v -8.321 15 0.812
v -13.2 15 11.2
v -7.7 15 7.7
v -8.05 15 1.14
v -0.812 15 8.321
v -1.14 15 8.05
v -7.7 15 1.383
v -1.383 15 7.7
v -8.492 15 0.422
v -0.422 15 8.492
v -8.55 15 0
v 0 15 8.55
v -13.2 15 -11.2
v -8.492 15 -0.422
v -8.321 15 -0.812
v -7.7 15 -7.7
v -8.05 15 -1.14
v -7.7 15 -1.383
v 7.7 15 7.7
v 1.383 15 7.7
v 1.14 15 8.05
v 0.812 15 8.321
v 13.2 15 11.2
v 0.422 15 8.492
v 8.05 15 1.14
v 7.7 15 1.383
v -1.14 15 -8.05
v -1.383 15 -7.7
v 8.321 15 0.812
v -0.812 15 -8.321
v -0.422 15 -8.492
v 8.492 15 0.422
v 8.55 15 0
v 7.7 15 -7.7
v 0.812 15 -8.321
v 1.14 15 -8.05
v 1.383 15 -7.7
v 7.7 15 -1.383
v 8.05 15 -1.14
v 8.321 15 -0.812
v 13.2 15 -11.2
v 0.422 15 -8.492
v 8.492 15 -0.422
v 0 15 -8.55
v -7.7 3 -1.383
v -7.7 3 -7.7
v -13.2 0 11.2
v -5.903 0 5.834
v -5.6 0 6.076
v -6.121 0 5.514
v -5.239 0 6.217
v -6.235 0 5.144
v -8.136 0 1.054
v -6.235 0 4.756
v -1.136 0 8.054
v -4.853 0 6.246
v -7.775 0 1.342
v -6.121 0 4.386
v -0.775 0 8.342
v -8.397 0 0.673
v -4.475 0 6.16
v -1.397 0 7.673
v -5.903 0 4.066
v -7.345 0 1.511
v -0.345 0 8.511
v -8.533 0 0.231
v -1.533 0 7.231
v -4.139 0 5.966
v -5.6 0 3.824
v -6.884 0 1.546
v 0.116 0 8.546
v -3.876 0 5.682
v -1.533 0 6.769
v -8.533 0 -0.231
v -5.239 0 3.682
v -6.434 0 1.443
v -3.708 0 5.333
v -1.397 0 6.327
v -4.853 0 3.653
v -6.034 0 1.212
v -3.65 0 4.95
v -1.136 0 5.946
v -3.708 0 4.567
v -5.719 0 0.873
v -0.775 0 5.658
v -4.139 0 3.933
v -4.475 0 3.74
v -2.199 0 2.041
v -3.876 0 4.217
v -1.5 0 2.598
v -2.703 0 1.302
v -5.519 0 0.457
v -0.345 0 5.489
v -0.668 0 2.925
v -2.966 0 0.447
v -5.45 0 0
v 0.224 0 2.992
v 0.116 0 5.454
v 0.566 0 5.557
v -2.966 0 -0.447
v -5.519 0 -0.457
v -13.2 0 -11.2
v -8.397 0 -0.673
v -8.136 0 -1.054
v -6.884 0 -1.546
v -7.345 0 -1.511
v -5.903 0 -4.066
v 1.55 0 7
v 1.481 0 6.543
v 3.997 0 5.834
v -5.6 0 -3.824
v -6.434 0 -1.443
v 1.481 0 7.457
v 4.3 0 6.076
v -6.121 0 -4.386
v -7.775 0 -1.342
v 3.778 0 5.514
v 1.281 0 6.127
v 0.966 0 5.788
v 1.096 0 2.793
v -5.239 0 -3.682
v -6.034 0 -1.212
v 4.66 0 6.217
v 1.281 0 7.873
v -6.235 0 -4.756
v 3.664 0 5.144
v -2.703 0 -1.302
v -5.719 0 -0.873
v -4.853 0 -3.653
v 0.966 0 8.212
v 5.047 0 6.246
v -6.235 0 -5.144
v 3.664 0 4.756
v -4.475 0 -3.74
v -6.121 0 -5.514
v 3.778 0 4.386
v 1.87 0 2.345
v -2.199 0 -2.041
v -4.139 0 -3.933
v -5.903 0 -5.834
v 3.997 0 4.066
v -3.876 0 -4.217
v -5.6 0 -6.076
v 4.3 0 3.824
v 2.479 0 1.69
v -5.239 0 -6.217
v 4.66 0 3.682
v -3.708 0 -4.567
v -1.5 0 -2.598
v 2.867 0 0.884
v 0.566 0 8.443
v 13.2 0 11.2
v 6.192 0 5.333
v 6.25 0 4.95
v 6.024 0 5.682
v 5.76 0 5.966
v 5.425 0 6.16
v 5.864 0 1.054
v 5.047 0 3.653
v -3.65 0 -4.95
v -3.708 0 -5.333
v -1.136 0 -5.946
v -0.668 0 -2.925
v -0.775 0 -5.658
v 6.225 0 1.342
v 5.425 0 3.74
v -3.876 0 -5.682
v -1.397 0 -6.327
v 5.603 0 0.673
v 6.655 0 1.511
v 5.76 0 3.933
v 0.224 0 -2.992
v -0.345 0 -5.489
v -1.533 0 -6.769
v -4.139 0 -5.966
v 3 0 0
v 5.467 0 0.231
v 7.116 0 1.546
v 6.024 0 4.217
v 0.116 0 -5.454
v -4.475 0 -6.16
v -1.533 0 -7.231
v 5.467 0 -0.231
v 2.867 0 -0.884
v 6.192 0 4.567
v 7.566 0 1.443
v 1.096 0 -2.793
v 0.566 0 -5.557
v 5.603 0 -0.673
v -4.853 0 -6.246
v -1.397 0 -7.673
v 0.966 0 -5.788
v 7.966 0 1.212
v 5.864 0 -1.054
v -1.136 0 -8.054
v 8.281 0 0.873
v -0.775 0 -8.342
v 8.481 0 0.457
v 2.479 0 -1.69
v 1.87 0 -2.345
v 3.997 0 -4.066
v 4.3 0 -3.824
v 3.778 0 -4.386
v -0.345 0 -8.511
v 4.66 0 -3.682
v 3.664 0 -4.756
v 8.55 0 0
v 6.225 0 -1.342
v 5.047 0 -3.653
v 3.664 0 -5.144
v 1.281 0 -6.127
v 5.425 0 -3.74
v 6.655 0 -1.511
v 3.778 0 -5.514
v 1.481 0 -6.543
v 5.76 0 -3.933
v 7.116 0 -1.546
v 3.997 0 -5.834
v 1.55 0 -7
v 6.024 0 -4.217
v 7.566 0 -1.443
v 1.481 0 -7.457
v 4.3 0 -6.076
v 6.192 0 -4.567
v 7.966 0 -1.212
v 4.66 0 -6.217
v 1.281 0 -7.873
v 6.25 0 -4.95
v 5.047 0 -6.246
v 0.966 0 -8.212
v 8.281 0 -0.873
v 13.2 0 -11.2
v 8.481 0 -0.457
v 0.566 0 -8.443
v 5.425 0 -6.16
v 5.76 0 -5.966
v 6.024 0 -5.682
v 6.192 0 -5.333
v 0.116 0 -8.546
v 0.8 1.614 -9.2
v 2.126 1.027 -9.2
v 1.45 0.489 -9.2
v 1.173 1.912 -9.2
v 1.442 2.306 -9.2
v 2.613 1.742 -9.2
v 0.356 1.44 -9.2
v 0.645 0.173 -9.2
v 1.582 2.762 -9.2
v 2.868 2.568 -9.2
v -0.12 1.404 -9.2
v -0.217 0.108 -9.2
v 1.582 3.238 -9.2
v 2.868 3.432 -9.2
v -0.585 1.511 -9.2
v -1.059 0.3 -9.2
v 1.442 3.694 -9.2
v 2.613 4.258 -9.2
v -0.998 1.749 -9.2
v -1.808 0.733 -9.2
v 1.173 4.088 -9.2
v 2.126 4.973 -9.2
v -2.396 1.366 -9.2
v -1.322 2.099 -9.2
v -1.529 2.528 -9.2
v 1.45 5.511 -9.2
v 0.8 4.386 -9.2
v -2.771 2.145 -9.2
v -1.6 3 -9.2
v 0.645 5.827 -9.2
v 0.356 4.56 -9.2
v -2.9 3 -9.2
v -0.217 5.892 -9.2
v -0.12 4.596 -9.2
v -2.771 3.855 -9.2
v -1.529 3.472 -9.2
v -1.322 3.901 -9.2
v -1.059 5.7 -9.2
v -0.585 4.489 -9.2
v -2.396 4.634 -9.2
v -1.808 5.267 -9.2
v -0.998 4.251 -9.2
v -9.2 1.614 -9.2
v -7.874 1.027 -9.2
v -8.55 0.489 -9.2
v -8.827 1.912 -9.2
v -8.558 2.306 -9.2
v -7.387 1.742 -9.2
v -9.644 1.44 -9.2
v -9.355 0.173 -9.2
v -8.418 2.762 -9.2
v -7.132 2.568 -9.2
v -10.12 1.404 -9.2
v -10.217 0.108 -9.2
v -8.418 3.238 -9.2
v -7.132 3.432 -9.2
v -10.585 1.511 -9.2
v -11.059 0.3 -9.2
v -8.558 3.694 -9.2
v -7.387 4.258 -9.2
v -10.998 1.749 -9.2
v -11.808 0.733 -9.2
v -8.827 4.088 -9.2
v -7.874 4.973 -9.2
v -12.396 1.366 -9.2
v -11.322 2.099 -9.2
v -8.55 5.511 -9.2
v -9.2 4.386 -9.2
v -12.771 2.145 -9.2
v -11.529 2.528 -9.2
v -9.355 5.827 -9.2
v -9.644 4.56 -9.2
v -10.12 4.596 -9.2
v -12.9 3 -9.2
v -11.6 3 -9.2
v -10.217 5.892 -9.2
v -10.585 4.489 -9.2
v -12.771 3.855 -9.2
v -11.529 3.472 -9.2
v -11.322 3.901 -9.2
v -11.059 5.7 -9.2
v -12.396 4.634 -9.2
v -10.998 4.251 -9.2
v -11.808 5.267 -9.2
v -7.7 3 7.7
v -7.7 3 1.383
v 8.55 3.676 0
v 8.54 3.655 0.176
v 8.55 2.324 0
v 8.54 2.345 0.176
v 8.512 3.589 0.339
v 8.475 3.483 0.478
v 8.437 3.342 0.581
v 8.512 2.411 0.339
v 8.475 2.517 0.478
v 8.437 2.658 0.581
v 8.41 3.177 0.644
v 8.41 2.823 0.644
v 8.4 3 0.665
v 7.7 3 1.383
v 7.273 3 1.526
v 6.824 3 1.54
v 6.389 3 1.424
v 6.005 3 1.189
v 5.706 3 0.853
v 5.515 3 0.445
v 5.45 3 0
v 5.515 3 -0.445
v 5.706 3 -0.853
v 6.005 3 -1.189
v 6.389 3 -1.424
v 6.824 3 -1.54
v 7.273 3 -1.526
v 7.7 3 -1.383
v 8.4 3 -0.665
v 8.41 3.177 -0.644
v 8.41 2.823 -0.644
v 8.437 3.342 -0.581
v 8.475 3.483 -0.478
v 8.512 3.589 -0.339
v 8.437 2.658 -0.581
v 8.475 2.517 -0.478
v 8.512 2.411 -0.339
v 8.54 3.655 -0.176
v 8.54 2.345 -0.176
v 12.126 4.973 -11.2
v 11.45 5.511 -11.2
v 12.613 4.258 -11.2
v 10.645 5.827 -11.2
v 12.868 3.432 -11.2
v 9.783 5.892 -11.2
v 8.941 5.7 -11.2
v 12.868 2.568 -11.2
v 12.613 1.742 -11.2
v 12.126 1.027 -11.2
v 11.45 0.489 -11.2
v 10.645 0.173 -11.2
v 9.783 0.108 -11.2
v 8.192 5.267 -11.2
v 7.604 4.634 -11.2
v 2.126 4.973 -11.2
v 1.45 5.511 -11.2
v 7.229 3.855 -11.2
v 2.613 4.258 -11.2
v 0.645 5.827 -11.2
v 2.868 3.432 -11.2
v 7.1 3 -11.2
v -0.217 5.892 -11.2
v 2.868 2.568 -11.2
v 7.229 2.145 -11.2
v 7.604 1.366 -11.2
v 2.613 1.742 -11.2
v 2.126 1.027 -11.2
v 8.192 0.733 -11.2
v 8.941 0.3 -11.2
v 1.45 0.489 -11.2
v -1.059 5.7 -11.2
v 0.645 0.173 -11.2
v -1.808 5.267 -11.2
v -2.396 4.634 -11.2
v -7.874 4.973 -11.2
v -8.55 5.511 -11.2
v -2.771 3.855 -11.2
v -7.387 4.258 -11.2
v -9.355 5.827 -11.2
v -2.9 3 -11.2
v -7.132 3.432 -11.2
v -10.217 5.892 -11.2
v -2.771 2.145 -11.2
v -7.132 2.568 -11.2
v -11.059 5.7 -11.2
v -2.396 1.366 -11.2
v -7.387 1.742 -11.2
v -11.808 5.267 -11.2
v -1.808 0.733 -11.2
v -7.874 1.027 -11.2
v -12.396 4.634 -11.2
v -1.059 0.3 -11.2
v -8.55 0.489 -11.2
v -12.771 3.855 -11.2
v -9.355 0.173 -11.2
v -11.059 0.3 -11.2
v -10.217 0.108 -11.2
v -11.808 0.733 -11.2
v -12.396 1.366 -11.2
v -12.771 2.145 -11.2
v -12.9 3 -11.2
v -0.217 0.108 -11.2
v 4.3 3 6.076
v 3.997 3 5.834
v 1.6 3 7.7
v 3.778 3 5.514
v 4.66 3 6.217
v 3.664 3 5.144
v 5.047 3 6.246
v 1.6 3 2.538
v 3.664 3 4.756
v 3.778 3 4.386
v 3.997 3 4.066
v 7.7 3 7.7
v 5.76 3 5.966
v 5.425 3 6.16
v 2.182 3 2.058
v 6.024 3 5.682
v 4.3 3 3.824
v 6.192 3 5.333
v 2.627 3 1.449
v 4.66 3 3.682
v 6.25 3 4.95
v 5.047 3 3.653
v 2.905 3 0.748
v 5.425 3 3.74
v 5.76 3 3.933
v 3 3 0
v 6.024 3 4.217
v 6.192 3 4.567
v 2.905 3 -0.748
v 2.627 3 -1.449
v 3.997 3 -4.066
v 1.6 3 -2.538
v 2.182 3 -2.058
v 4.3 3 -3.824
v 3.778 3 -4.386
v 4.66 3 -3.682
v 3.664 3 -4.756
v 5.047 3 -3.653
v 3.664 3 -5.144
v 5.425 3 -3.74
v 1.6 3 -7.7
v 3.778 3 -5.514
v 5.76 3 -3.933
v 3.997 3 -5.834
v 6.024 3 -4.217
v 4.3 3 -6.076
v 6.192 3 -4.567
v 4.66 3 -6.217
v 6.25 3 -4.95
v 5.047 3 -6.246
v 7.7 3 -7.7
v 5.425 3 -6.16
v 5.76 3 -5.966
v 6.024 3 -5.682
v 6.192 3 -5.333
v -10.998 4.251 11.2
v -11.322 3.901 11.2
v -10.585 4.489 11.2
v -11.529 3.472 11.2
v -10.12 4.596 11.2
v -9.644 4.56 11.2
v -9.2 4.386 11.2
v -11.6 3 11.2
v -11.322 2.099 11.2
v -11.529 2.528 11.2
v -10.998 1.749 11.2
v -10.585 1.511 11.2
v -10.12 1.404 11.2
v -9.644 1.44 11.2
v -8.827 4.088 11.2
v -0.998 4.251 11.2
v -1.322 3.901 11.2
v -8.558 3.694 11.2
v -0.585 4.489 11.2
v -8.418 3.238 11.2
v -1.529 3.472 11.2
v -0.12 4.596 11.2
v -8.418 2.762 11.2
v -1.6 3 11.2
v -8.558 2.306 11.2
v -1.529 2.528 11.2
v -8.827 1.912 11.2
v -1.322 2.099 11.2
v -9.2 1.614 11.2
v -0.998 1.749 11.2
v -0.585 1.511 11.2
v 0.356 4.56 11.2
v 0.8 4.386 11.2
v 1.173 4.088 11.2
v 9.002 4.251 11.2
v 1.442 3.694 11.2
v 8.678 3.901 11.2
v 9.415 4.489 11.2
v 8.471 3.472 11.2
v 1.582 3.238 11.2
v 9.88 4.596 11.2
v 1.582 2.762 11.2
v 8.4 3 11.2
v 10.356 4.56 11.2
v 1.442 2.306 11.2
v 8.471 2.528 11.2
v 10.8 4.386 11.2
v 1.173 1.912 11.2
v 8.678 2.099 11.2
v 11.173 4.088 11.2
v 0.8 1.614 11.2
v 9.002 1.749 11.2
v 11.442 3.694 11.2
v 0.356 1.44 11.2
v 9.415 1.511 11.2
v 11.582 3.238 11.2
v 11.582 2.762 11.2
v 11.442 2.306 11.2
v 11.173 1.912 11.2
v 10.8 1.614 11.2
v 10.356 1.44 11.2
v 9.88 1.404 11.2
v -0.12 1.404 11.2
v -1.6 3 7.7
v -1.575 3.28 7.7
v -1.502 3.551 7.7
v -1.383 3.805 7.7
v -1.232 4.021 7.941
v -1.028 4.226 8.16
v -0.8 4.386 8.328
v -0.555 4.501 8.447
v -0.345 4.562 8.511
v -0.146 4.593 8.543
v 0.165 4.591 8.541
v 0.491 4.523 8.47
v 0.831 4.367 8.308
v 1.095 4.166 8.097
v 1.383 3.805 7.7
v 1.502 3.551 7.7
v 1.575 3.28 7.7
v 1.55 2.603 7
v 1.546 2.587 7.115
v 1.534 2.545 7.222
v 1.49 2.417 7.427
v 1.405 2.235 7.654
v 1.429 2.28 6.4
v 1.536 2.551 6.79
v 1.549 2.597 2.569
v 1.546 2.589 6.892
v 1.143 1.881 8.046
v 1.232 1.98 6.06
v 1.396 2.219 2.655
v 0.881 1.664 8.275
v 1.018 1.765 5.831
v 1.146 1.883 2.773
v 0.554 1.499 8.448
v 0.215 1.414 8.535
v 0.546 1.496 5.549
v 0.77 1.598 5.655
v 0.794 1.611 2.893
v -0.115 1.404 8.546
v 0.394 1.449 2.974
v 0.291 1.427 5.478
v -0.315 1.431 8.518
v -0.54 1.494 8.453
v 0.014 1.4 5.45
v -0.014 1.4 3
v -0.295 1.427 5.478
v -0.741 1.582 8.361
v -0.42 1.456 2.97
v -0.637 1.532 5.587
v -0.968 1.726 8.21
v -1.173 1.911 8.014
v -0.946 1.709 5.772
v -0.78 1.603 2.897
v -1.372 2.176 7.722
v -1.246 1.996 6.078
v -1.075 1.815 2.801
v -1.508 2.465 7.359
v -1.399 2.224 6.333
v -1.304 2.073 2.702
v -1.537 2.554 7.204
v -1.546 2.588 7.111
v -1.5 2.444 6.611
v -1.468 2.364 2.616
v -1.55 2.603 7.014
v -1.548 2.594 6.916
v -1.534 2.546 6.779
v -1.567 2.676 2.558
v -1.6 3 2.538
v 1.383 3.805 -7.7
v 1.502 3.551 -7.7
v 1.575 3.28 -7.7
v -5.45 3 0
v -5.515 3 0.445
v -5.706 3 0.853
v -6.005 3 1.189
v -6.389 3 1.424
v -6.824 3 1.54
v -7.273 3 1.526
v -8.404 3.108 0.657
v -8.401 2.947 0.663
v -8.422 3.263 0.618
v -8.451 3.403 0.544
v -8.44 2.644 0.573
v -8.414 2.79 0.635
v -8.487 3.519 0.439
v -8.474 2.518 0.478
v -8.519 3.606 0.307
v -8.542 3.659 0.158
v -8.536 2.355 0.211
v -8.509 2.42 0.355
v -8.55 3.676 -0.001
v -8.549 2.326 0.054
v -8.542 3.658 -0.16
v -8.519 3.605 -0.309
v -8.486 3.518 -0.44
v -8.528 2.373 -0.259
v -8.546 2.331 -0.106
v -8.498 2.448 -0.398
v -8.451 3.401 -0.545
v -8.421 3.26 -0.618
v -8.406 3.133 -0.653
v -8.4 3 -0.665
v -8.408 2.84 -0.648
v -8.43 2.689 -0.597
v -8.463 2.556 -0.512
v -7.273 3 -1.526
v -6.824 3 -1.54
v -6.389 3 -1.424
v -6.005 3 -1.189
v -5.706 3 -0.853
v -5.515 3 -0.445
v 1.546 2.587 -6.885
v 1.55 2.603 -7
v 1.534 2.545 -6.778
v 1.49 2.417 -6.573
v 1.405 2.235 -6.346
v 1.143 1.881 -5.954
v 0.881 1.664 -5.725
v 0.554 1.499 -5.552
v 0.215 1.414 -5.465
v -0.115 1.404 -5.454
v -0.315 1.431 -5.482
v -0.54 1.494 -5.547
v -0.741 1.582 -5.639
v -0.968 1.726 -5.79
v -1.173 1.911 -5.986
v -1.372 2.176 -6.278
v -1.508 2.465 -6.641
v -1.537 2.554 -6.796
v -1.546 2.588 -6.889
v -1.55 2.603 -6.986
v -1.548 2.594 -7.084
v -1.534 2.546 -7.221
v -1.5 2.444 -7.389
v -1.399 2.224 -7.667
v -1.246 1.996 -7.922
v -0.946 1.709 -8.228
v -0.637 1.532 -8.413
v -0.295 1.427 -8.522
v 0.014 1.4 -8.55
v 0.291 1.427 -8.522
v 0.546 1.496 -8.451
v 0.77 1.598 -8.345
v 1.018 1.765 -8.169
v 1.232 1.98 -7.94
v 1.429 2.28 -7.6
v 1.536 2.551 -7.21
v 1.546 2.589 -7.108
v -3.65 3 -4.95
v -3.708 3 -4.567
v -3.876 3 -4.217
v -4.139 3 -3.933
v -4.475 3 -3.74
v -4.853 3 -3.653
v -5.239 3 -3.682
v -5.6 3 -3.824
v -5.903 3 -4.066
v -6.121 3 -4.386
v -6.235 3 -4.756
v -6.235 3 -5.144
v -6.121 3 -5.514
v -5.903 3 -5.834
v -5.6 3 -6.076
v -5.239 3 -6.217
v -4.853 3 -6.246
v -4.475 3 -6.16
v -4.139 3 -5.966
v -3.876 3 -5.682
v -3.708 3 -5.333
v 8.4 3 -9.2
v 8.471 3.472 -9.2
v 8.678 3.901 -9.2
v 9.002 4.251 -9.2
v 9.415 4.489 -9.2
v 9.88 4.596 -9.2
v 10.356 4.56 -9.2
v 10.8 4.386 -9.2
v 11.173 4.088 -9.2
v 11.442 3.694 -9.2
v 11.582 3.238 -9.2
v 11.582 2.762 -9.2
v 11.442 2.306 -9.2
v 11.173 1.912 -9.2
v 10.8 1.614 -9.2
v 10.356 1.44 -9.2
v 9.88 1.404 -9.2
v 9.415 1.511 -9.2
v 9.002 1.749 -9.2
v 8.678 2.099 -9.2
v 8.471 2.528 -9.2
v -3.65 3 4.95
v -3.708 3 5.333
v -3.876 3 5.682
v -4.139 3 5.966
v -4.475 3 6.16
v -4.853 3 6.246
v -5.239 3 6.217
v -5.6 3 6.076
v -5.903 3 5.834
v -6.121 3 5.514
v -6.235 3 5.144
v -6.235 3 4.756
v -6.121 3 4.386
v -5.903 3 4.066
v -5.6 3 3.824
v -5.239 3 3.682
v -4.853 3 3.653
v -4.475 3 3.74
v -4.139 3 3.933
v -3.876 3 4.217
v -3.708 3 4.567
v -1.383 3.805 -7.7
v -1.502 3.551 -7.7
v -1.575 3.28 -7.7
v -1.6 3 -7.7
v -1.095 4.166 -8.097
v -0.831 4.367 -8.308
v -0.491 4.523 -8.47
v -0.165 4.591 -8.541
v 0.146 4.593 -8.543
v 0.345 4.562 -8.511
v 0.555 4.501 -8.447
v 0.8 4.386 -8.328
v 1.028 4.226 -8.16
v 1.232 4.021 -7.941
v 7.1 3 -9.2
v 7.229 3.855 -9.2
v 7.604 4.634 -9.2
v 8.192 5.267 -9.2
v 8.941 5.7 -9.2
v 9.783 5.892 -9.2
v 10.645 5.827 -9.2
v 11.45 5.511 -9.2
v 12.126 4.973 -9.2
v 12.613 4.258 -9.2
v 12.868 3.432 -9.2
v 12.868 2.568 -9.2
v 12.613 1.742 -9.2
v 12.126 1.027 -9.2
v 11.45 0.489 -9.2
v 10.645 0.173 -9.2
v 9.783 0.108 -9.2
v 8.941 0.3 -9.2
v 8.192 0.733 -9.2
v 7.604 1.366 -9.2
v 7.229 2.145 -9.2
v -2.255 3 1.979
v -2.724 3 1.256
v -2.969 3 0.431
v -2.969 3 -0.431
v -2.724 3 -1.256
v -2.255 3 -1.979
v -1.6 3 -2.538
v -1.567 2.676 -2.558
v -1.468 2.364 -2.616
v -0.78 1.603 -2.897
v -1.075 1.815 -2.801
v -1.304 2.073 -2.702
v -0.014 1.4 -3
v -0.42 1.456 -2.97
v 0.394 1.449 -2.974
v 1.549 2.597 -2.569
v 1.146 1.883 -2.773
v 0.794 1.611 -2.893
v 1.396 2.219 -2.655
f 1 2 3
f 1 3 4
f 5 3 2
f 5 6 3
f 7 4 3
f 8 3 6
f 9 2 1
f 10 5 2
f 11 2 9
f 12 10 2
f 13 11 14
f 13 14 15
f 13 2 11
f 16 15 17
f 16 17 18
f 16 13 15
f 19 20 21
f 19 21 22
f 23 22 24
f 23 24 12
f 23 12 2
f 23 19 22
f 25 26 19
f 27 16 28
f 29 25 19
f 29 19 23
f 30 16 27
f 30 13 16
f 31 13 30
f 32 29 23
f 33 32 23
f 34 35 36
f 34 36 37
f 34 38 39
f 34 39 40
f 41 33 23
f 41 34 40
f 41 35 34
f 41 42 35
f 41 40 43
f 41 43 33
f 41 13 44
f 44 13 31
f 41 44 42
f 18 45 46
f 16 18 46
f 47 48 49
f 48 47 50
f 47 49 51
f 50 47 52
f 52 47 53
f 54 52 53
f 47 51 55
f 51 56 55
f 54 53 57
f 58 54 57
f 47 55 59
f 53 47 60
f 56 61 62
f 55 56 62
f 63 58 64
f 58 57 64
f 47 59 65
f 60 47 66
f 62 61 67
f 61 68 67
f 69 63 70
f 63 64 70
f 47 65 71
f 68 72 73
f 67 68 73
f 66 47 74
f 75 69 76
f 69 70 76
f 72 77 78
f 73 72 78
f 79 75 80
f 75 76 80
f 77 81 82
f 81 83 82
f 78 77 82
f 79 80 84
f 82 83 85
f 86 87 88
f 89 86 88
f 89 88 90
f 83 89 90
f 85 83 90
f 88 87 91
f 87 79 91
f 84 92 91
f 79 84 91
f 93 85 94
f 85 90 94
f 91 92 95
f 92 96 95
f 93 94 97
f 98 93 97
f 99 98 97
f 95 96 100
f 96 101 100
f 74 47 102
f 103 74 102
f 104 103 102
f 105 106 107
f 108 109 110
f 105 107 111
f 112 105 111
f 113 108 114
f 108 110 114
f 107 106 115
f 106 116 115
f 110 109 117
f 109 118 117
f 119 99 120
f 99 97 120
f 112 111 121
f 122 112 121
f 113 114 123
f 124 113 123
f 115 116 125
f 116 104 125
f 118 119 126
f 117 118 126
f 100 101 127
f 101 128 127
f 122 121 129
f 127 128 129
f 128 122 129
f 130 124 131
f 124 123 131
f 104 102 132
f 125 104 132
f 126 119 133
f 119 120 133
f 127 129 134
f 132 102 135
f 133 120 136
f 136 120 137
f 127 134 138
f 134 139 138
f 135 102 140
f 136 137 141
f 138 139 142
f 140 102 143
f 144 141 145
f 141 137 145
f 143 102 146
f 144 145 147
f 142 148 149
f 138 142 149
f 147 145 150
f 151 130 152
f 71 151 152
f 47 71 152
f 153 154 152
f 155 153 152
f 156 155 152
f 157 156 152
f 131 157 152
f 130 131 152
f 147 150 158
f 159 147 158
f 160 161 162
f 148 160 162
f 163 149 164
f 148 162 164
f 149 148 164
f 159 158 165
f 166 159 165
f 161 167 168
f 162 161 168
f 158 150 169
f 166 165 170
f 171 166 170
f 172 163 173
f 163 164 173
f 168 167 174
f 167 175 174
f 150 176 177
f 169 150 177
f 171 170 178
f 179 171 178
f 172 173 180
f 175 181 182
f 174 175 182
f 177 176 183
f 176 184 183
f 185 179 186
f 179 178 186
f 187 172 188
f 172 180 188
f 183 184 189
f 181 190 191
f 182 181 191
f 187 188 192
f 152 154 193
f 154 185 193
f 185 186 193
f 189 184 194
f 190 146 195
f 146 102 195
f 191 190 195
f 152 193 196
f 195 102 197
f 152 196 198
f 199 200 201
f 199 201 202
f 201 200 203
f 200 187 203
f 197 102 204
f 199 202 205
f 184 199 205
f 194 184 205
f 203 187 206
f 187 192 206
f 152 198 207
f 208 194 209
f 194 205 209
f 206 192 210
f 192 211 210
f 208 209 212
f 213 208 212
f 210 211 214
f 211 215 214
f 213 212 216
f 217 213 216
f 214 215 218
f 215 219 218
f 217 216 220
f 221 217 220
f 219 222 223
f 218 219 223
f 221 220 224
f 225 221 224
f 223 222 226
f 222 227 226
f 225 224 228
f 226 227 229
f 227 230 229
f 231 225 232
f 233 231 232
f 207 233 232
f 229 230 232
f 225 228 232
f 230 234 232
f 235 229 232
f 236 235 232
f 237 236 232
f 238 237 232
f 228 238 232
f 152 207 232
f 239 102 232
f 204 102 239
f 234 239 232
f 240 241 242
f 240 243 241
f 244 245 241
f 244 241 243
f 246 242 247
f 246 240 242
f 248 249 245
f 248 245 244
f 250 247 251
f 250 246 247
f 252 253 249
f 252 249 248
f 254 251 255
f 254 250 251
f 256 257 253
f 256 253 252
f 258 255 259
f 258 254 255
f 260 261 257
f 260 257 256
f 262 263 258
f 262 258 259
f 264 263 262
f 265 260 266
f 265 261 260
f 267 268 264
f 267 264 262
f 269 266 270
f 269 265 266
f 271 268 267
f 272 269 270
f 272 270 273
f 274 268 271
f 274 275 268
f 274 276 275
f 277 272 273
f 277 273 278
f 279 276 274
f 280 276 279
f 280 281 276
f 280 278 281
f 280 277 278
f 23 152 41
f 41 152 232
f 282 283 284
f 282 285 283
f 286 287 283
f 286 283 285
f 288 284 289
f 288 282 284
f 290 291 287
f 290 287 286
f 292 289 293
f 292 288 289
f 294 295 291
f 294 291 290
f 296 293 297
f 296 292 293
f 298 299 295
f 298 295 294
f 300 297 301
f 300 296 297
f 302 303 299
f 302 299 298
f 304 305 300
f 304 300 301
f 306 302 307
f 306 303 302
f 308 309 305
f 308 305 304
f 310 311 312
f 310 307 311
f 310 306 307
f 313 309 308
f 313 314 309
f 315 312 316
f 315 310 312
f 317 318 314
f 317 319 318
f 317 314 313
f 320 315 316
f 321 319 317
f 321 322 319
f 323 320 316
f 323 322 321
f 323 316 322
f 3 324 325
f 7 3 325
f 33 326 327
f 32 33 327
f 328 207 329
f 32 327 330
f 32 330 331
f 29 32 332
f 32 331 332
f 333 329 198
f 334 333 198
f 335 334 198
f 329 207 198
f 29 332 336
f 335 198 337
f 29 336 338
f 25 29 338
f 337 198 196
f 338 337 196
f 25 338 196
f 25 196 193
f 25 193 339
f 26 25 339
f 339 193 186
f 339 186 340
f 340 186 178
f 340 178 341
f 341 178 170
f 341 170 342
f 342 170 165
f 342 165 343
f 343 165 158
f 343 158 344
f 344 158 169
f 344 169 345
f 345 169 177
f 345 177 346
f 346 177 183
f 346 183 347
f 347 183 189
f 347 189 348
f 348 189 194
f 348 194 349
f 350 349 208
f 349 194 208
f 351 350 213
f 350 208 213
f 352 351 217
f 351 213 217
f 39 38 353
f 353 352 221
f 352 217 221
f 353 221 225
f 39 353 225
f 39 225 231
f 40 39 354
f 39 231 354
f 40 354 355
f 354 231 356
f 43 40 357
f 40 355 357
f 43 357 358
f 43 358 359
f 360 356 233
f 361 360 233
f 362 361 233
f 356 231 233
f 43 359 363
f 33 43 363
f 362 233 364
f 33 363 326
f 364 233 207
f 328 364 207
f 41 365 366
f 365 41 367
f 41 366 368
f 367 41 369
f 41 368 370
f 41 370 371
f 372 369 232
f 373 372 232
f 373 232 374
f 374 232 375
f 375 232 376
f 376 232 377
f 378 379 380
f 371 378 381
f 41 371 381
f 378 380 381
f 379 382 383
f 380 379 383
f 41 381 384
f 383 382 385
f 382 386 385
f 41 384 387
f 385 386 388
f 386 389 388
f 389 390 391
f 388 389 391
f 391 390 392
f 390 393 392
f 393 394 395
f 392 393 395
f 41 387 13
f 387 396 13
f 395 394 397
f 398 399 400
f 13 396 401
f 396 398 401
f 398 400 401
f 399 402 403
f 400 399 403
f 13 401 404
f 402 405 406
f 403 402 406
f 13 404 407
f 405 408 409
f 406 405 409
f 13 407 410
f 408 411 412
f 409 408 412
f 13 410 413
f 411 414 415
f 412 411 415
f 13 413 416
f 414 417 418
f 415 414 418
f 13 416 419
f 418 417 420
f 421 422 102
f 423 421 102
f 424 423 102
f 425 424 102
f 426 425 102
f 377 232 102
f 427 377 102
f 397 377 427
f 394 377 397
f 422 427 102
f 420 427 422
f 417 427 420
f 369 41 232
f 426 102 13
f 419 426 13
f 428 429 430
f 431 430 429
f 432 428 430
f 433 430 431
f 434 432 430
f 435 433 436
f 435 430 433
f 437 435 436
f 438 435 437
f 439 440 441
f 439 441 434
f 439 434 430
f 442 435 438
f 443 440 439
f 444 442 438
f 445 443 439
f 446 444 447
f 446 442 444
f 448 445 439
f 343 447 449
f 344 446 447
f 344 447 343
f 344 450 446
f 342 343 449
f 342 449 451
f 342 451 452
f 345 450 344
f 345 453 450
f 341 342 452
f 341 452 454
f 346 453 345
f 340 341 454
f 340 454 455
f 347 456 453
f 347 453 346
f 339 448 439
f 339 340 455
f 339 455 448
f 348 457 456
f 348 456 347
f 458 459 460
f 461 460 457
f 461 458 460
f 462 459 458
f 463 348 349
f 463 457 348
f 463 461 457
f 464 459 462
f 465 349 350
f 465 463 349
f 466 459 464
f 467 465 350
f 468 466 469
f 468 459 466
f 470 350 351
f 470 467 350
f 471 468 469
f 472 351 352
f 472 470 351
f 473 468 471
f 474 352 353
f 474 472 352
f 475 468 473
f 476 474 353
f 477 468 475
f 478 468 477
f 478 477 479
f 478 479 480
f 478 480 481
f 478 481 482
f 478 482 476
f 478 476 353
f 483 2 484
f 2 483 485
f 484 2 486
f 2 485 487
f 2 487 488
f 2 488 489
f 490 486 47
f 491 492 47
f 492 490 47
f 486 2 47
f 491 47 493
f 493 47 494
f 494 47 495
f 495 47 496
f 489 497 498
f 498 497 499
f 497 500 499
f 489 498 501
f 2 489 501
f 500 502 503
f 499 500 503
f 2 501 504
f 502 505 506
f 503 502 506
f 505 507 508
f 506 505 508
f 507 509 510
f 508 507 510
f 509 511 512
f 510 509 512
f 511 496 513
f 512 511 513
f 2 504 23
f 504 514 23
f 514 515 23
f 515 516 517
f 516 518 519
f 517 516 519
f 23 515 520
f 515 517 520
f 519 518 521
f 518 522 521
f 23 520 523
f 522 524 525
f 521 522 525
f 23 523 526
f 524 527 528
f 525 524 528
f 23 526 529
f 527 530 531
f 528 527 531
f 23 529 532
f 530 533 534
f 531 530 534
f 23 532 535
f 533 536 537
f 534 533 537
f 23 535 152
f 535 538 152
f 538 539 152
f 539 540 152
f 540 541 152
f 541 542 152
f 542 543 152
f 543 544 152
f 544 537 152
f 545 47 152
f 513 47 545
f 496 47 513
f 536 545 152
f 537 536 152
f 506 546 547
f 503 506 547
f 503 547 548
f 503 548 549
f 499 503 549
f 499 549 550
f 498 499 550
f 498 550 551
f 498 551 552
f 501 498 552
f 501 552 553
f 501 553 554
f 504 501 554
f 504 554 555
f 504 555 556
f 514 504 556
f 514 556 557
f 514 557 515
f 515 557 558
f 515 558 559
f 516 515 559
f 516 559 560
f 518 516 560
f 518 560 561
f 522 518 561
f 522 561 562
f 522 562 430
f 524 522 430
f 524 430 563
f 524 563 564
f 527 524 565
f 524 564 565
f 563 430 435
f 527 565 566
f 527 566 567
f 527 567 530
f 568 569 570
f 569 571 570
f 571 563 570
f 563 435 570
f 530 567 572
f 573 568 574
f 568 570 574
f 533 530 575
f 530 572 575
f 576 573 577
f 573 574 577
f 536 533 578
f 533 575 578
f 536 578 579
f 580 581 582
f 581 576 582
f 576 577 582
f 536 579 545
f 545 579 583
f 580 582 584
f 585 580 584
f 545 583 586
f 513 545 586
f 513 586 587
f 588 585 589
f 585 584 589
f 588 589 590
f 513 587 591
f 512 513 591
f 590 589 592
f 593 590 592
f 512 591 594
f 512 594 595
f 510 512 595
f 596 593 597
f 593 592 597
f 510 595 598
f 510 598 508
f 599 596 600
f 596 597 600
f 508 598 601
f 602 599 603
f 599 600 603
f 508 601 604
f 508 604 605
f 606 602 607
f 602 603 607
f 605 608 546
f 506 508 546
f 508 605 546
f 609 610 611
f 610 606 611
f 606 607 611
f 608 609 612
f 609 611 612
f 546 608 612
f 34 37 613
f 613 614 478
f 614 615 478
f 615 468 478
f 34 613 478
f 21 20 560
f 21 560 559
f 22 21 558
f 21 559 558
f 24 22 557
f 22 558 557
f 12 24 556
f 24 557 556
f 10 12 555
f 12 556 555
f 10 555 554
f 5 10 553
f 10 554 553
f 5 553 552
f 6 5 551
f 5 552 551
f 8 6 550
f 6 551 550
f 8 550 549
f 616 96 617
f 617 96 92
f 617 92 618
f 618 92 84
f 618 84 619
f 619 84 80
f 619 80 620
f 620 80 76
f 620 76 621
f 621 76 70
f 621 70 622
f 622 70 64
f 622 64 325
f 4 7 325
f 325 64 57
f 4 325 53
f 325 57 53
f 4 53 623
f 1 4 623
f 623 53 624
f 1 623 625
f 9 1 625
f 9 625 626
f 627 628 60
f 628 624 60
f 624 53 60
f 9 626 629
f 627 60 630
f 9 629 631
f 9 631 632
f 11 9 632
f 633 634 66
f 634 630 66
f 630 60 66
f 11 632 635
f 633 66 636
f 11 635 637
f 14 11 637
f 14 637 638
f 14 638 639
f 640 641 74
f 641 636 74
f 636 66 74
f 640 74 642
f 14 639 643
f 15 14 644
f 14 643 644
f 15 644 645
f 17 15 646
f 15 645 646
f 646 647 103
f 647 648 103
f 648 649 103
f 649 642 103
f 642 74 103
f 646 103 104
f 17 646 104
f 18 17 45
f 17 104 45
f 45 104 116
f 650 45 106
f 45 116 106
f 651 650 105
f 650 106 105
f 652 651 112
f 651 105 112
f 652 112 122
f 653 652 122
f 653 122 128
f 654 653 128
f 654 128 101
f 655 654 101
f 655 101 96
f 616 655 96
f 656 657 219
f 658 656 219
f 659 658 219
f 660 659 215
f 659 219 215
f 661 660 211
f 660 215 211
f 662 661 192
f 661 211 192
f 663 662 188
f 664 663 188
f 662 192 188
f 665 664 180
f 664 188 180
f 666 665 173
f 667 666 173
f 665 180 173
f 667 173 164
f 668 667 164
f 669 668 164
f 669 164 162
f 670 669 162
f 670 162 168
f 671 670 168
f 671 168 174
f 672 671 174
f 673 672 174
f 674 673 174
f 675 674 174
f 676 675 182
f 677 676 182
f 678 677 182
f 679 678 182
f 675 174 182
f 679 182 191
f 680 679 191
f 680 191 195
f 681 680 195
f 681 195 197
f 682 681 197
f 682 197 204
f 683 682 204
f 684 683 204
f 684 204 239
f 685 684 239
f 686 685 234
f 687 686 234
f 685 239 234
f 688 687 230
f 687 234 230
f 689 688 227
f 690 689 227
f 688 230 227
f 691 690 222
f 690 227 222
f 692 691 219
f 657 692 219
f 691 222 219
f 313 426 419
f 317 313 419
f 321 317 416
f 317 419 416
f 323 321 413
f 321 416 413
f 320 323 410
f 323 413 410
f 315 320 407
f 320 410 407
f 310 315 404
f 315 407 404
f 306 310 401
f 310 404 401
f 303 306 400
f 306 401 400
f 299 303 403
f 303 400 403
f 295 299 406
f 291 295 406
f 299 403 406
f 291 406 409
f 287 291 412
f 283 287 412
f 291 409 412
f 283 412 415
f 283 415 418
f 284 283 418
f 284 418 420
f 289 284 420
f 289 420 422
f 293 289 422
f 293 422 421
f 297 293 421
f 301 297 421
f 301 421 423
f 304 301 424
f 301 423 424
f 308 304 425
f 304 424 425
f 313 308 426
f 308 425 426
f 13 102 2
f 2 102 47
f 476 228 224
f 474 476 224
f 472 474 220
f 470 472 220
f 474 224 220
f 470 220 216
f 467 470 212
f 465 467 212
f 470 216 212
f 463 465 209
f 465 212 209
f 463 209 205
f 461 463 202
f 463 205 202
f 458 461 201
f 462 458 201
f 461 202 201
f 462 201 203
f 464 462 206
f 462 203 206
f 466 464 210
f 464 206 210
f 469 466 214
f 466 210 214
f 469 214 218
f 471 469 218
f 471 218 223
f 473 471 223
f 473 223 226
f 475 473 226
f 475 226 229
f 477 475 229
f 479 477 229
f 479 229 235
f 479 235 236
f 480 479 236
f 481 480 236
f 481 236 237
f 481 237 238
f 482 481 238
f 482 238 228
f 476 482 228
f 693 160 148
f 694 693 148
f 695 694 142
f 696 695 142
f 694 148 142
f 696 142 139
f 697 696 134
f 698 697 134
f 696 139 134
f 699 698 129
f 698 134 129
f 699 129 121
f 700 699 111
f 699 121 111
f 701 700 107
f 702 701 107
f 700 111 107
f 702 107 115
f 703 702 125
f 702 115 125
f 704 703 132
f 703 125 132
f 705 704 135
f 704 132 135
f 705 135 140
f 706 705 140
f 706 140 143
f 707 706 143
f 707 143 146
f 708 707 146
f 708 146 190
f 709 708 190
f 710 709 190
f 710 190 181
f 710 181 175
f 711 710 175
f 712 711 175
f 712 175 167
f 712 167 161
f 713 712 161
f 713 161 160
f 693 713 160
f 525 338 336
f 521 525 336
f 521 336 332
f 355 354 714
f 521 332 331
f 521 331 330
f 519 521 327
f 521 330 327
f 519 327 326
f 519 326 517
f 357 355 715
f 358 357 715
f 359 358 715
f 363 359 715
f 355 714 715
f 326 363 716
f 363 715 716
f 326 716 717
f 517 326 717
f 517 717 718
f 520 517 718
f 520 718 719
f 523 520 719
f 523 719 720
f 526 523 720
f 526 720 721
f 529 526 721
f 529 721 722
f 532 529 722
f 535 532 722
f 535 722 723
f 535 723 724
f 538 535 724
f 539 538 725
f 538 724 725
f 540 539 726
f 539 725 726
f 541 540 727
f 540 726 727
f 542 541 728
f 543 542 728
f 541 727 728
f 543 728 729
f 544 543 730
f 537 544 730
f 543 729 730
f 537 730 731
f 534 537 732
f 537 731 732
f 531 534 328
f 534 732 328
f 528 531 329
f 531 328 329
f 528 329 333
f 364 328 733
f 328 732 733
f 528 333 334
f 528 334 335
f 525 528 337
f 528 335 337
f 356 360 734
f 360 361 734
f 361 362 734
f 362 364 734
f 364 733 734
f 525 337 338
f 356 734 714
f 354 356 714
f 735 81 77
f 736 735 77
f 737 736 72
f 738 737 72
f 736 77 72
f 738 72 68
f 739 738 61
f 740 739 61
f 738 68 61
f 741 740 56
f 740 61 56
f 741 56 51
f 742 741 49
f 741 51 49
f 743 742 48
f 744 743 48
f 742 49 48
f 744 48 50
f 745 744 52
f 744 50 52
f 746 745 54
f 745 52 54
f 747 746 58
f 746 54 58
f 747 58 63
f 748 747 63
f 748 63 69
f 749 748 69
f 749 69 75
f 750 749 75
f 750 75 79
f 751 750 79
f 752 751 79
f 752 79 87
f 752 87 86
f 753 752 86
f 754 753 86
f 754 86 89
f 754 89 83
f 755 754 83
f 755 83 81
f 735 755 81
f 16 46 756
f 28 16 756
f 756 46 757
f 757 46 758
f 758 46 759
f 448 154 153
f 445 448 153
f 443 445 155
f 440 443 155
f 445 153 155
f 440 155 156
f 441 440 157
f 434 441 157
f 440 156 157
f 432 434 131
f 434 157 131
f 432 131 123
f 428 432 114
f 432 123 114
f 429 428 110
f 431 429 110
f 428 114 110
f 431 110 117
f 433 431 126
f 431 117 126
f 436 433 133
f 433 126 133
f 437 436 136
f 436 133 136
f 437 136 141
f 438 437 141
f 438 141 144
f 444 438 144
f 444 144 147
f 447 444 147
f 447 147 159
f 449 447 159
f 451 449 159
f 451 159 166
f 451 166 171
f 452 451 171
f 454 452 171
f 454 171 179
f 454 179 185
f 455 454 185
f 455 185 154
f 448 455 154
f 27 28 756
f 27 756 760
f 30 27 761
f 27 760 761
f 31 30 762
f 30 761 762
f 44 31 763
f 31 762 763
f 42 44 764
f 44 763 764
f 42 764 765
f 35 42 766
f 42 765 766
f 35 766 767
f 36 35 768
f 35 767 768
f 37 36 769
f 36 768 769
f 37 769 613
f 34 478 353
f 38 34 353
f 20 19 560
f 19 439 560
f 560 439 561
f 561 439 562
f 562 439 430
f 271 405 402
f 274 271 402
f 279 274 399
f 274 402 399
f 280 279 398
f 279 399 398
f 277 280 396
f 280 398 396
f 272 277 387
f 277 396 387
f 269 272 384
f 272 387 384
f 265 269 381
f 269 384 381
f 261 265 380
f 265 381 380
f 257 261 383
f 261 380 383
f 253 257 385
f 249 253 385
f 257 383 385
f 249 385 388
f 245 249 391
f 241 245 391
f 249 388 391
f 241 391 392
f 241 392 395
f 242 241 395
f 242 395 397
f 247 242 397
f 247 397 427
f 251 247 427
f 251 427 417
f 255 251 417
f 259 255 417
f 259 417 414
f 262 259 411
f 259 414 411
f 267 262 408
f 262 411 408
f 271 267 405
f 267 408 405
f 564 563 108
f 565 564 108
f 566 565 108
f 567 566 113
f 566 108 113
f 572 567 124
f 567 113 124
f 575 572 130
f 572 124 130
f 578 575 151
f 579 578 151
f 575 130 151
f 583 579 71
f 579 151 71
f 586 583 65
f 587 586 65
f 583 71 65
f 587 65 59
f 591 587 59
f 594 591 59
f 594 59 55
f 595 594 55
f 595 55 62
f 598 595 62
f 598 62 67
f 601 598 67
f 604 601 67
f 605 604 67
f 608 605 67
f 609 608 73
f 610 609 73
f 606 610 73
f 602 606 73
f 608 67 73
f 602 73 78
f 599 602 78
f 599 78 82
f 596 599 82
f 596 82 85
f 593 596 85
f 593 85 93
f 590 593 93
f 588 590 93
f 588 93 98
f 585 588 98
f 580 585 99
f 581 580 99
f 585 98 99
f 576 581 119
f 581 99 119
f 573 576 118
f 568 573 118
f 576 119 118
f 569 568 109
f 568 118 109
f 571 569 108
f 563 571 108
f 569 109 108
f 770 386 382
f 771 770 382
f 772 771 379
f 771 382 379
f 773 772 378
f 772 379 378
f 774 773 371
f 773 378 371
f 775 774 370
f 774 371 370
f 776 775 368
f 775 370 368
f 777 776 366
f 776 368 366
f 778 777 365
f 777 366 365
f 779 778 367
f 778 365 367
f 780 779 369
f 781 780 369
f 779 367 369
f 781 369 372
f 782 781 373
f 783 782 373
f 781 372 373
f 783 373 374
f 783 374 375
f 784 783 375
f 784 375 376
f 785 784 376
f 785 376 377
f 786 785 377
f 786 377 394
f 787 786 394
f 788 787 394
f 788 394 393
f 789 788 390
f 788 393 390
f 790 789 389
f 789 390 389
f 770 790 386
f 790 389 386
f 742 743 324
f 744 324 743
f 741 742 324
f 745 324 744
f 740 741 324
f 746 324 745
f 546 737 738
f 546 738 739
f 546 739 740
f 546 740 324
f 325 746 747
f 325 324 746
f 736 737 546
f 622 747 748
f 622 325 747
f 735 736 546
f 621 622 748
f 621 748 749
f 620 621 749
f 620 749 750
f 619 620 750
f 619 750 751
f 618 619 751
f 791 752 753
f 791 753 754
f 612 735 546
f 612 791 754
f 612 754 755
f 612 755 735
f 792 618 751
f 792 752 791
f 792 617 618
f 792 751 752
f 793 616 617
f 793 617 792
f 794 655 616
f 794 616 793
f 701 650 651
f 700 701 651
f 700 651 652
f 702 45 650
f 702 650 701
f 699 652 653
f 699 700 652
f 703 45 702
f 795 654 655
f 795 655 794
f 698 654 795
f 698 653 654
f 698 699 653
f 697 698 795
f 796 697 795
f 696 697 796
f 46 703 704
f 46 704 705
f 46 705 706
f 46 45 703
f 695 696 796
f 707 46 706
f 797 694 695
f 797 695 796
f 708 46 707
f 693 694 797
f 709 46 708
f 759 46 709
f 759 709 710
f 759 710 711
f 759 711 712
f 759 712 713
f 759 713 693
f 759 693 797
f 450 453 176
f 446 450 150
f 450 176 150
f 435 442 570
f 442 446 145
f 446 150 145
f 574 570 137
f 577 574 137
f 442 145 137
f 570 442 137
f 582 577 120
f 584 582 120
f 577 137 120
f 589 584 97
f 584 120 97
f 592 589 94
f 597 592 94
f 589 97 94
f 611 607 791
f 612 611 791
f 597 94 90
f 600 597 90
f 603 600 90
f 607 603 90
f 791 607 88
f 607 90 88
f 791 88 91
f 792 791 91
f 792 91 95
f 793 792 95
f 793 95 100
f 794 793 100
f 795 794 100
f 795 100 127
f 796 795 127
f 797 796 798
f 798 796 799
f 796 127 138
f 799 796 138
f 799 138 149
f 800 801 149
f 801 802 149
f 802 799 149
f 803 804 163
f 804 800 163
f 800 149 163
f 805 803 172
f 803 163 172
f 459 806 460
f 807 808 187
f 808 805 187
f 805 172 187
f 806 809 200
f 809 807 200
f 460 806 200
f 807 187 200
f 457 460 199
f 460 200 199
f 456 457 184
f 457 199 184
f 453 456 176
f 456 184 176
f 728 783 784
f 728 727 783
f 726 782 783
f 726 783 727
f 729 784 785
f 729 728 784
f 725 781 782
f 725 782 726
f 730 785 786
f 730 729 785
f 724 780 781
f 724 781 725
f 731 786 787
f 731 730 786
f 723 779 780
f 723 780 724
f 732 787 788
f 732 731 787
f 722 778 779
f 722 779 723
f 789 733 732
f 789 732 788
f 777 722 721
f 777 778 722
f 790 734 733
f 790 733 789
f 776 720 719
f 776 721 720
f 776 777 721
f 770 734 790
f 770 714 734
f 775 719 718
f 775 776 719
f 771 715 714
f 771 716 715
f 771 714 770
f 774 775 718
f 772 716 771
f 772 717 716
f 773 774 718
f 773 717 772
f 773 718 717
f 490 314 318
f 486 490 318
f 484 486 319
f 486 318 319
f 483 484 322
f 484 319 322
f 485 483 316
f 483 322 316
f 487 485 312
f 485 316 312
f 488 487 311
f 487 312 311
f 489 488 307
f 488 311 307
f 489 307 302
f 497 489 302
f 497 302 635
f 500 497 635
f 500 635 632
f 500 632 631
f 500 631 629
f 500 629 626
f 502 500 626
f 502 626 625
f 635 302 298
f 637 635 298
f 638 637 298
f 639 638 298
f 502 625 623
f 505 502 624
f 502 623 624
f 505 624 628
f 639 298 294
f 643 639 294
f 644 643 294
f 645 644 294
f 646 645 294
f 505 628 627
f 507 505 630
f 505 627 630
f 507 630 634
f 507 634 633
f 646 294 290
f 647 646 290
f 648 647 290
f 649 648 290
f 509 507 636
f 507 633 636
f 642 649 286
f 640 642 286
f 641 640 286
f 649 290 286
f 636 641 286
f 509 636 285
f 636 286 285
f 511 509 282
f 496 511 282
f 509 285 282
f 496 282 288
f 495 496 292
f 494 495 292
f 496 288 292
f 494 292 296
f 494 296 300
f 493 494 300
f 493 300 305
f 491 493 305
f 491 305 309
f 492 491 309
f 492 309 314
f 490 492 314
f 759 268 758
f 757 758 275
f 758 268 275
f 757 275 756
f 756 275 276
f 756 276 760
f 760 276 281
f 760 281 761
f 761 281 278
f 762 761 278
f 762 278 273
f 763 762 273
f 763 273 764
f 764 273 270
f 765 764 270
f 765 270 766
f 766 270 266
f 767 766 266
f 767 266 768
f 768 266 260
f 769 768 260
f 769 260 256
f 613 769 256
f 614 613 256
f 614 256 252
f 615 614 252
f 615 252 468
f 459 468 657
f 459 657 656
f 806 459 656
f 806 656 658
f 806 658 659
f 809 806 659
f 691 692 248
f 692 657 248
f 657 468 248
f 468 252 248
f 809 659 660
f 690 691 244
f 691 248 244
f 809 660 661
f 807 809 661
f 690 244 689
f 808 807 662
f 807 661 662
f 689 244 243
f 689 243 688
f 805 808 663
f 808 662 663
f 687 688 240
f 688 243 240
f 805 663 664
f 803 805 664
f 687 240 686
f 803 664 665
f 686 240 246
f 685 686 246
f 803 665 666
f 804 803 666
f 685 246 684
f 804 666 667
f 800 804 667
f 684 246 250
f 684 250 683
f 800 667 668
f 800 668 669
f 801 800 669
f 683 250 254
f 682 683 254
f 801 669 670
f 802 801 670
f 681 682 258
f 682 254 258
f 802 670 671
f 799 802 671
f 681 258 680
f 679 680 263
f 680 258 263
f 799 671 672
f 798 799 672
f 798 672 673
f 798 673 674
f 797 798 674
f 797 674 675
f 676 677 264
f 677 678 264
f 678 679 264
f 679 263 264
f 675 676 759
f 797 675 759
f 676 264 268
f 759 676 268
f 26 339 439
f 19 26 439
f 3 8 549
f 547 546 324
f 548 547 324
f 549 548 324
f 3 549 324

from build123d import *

# Parameters (mm, degrees)
SKETCH_1_W          = 15.4
SKETCH_1_H          = 22.4
EXTRUDE_2_DEPTH     = 3
EXTRUDE_3_DEPTH     = 10
EXTRUDE_3_2_DEPTH   = 10
EXTRUDE_4_DEPTH     = 15
SKETCH_3_R          = 1.6
CUT_EXTRUDE_2_DEPTH = 31.8
SKETCH_9_R          = 1.3
SKETCH_9_R_2        = 3
SKETCH_9_R_3        = 1.55
CUT_EXTRUDE_6_DEPTH = 16
SKETCH_10_R         = 2.9
CUT_EXTRUDE_7_DEPTH = 2


with BuildPart() as part:
    # 草图1 → 凸台-拉伸2 (new body)
    with BuildSketch(Plane(origin=(0, 0, 0), x_dir=(1, 0, 0), z_dir=(0, 1, 0))):
        Rectangle(SKETCH_1_W, SKETCH_1_H)
    extrude(amount=EXTRUDE_2_DEPTH)



with BuildPart() as body_2:
    # 草图1<4> → 凸台-拉伸3 (new body)
    with BuildSketch(Plane(origin=(0, 0, 0), x_dir=(1, 0, 0), z_dir=(0, 1, 0))):
        Polygon((7.7, -11.2), (7.7, -7.7), (0, -7.7), (-4.7, -7.7), (-7.7, -7.7), (-7.7, -11.2), align=None)
    extrude(amount=EXTRUDE_3_DEPTH)


with BuildPart() as body_3:
    # 草图1<4> → Extrude 3 2 (new body)
    with BuildSketch(Plane(origin=(0, 0, 0), x_dir=(1, 0, 0), z_dir=(0, 1, 0))):
        Polygon((-7.7, 7.7), (0, 7.7), (7.7, 7.7), (7.7, 11.2), (-7.7, 11.2), align=None)
    extrude(amount=EXTRUDE_3_2_DEPTH)


with BuildPart() as part_1:
    add(part.part)

    add(body_2.part)  # 凸台-拉伸4 merges body 2

    add(body_3.part)  # 凸台-拉伸4 merges body 3
    # 草图1<5> → 凸台-拉伸4 (add)
    with BuildSketch(Plane(origin=(0, 0, 0), x_dir=(1, 0, 0), z_dir=(0, 1, 0))):
        Polygon((-7.7, 0), (-7.7, 7.7), (-7.7, 11.2), (-13.2, 11.2), (-13.2, -11.2), (-7.7, -11.2), (-7.7, -7.7), align=None)
        Polygon((7.7, 11.2), (7.7, 7.7), (7.7, 0), (7.7, -7.7), (7.7, -11.2), (13.2, -11.2), (13.2, 11.2), align=None)
        Polygon((7.7, -11.2), (7.7, -7.7), (0, -7.7), (-4.7, -7.7), (-7.7, -7.7), (-7.7, -11.2), align=None)
        Polygon((-7.7, 7.7), (0, 7.7), (7.7, 7.7), (7.7, 11.2), (-7.7, 11.2), align=None)
    extrude(amount=EXTRUDE_4_DEPTH)

    # 草图3 → 切除-拉伸2 (cut, through all)
    with BuildSketch(Plane(origin=(0, 0, -19.6), x_dir=(-1, 0, 0), z_dir=(0, 0, -1))):
        with Locations((0, 3)):
            Circle(SKETCH_3_R)
        with Locations((-10, 3)):
            Circle(SKETCH_3_R)
        with Locations((10, 3)):
            Circle(SKETCH_3_R)
    extrude(amount=-CUT_EXTRUDE_2_DEPTH, mode=Mode.SUBTRACT)

    # 草图9 → 切除-拉伸6 (cut, through all)
    with BuildSketch(Plane.XZ):
        with Locations((-4.949747468, -4.949747468)):
            Circle(SKETCH_9_R)
        with Locations((4.949747468, -4.949747468)):
            Circle(SKETCH_9_R)
        with Locations((4.949747468, 4.949747468)):
            Circle(SKETCH_9_R)
        with Locations((-4.949747468, 4.949747468)):
            Circle(SKETCH_9_R)
        Circle(SKETCH_9_R_2)
        with Locations((7, 0)):
            Circle(SKETCH_9_R_3)
        with Locations((0, 7)):
            Circle(SKETCH_9_R_3)
        with Locations((0, -7)):
            Circle(SKETCH_9_R_3)
        with Locations((-7, 0)):
            Circle(SKETCH_9_R_3)
    extrude(amount=-CUT_EXTRUDE_6_DEPTH, mode=Mode.SUBTRACT)

    # 草图10 → 切除-拉伸7 (cut)
    with BuildSketch(Plane(origin=(0, 0, -11.2), x_dir=(-1, 0, 0), z_dir=(0, 0, -1))):
        with Locations((10, 3)):
            Circle(SKETCH_10_R)
        with Locations((0, 3)):
            Circle(SKETCH_10_R)
        with Locations((-10, 3)):
            Circle(SKETCH_10_R)
    extrude(amount=-CUT_EXTRUDE_7_DEPTH, mode=Mode.SUBTRACT)


solid = part_1.part
